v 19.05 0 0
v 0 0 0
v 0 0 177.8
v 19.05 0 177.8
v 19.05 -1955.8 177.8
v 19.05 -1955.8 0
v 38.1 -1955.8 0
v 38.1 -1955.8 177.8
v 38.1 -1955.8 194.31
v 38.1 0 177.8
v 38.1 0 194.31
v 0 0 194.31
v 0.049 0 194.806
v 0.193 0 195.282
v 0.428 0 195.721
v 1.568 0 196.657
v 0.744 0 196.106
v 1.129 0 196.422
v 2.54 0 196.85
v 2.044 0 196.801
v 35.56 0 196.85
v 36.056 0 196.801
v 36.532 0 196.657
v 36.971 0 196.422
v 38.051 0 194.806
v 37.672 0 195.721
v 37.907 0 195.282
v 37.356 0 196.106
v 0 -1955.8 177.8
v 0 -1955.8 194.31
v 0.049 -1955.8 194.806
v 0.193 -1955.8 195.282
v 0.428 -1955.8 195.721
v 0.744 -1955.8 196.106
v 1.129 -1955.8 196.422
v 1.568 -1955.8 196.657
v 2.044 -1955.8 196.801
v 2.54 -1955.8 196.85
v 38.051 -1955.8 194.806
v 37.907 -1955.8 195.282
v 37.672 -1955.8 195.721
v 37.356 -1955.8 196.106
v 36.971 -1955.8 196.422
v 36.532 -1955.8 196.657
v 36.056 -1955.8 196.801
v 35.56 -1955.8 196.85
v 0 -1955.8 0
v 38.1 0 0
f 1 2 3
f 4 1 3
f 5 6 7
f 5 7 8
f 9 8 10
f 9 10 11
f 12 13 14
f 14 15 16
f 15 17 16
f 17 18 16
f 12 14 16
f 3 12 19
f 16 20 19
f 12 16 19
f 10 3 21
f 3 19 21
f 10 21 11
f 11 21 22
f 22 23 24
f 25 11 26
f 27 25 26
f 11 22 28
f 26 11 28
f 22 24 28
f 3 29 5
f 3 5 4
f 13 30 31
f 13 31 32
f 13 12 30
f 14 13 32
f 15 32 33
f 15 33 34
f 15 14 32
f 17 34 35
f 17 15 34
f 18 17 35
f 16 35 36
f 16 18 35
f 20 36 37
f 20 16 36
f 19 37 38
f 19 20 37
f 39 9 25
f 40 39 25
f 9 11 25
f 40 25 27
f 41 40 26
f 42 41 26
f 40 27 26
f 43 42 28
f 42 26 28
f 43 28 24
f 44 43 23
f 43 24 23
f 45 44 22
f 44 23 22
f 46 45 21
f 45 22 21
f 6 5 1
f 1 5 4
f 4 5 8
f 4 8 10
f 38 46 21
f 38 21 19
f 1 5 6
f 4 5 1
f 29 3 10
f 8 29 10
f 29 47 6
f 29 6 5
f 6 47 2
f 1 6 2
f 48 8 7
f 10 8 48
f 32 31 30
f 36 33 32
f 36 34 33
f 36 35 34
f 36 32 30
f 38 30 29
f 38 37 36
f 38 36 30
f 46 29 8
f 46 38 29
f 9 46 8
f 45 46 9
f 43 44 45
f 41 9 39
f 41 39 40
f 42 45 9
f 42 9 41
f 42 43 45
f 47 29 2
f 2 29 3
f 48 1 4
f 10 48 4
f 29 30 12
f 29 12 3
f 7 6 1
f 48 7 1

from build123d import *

# Parameters (mm, degrees)
F0_W     = 1955.8
F0_H     = 177.8
F1_DEPTH = 19.05
F2_W     = 1955.8
F2_H     = 177.8
F3_DEPTH = 19.05
F5_DEPTH = 1955.8
F6_R     = 2.54


with BuildPart() as f1:
    # F0 (on Right) → F1 (new body)
    with BuildSketch(Plane.YZ):
        with Locations((-977.9, 88.9)):
            Rectangle(F0_W, F0_H)
    extrude(amount=F1_DEPTH)


with BuildPart() as f3:
    # F2 (on face) → F3 (new body)
    with BuildSketch(Plane.YZ.offset(19.05)):
        with Locations((-977.9, 88.9)):
            Rectangle(F2_W, F2_H)
    extrude(amount=F3_DEPTH)


with BuildPart() as f5:
    # F4 (on face) → F5 (new body, through all)
    with BuildSketch(Plane.XZ.offset(1955.8)):
        Polygon((0, 196.85), (0, 177.8), (19.05, 177.8), (38.1, 177.8), (38.1, 196.85), align=None)
    extrude(amount=-F5_DEPTH)

    # F6
    f6_edges = [f5.edges().sort_by_distance(p)[0] for p in [
        (0, -977.9, 196.85),
        (38.1, -977.9, 196.85),
    ]]
    fillet(f6_edges, radius=F6_R)


solid = Compound([f1.part, f3.part, f5.part])
